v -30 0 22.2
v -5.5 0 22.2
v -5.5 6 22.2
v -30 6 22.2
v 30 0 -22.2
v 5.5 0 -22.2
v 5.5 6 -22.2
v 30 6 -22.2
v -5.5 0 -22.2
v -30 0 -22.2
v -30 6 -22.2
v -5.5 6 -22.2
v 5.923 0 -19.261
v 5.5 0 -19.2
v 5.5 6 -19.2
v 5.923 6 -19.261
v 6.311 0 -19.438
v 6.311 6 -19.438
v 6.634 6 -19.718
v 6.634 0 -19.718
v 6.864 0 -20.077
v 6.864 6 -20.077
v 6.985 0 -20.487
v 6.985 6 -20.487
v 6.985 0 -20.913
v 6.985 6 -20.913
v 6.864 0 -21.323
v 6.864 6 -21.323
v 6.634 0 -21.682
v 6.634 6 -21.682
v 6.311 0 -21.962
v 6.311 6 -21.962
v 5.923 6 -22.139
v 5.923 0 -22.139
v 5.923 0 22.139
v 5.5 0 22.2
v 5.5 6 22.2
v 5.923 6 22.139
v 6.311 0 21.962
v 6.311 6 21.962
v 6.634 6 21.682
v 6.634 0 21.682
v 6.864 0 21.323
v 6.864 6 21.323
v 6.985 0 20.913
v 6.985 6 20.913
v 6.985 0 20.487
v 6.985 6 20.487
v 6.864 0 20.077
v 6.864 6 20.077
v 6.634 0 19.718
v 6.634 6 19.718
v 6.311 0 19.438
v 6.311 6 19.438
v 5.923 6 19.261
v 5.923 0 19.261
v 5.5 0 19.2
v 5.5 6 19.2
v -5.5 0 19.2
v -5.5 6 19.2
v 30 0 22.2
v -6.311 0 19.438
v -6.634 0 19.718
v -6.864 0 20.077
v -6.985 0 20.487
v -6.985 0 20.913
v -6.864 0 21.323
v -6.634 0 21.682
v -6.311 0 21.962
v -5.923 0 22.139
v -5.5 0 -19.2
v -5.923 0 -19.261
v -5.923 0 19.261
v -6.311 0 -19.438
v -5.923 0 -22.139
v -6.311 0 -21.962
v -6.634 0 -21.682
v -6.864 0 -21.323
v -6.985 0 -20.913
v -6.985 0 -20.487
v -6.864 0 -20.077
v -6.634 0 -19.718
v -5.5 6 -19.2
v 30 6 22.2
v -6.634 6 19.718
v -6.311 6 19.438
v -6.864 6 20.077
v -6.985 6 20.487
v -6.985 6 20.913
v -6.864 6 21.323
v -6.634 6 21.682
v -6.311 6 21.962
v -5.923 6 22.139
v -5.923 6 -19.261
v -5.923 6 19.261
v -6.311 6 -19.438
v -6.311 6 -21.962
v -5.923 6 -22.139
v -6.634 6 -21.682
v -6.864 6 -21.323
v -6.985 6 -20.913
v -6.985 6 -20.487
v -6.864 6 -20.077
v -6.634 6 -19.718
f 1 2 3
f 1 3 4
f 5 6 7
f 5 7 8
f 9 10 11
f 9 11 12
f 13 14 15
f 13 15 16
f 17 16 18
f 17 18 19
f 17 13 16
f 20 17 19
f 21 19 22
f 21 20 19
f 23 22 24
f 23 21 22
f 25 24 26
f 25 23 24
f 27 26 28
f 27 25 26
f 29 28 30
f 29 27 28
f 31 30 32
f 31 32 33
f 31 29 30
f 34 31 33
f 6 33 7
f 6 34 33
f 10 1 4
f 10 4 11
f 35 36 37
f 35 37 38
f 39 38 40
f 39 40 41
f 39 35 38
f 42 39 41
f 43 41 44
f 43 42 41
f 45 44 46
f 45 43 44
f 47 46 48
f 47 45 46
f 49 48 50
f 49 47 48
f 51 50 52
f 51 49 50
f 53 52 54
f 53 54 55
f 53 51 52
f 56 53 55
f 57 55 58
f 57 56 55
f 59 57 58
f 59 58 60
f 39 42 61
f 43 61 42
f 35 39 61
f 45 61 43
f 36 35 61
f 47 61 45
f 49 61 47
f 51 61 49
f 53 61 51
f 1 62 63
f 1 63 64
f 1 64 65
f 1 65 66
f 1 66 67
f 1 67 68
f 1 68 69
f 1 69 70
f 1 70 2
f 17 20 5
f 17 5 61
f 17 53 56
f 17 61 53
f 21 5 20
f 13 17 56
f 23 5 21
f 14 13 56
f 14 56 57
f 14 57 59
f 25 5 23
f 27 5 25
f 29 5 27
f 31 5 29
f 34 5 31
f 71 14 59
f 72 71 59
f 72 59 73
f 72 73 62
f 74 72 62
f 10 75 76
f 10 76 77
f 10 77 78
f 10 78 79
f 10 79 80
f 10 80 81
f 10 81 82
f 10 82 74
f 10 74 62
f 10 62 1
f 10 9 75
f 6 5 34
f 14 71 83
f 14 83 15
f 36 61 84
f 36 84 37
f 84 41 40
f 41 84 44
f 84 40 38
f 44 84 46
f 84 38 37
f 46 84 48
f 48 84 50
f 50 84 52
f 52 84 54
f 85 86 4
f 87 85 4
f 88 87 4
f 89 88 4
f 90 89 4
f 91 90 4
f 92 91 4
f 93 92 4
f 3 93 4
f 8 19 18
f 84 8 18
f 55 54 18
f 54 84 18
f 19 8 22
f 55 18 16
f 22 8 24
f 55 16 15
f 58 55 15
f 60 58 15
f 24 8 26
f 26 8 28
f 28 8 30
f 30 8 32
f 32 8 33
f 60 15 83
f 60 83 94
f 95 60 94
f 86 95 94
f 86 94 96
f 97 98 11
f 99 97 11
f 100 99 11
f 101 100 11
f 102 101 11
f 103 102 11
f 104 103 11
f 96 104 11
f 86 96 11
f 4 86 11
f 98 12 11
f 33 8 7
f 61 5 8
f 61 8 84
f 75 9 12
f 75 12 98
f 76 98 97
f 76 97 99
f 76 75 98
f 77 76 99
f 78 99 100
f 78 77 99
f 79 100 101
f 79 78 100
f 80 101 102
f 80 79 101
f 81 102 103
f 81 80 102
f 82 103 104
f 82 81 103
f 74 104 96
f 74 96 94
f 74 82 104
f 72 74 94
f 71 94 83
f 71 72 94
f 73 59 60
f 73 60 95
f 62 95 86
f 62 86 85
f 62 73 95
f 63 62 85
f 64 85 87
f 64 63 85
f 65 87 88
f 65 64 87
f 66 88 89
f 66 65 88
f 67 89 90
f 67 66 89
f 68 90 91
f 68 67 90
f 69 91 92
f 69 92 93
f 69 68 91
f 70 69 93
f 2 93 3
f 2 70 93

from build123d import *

# Parameters (mm, degrees)
BOSS_EXTRUDE1_DEPTH = 6


with BuildPart() as part:
    # Sketch1 → Boss-Extrude1 (new body)
    with BuildSketch(Plane(origin=(0, 0, 0), x_dir=(1, 0, 0), z_dir=(0, 1, 0))):
        with BuildLine():
            Line((-30, 0), (-30, 22.2))
            Line((-30, 22.2), (-5.5, 22.2))
            ThreePointArc((-5.5, 22.2), (-7, 20.7), (-5.5, 19.2))
            Line((-5.5, 19.2), (0, 19.2))
            Line((0, 19.2), (5.5, 19.2))
            ThreePointArc((5.5, 19.2), (7, 20.7), (5.5, 22.2))
            Line((5.5, 22.2), (30, 22.2))
            Line((30, 22.2), (30, 0))
            Line((30, 0), (30, -22.2))
            Line((30, -22.2), (5.5, -22.2))
            ThreePointArc((5.5, -22.2), (7, -20.7), (5.5, -19.2))
            Line((5.5, -19.2), (0, -19.2))
            Line((0, -19.2), (-5.5, -19.2))
            ThreePointArc((-5.5, -19.2), (-7, -20.7), (-5.5, -22.2))
            Line((-5.5, -22.2), (-30, -22.2))
            Line((-30, -22.2), (-30, 0))
        make_face()
    extrude(amount=BOSS_EXTRUDE1_DEPTH)


solid = part.part
